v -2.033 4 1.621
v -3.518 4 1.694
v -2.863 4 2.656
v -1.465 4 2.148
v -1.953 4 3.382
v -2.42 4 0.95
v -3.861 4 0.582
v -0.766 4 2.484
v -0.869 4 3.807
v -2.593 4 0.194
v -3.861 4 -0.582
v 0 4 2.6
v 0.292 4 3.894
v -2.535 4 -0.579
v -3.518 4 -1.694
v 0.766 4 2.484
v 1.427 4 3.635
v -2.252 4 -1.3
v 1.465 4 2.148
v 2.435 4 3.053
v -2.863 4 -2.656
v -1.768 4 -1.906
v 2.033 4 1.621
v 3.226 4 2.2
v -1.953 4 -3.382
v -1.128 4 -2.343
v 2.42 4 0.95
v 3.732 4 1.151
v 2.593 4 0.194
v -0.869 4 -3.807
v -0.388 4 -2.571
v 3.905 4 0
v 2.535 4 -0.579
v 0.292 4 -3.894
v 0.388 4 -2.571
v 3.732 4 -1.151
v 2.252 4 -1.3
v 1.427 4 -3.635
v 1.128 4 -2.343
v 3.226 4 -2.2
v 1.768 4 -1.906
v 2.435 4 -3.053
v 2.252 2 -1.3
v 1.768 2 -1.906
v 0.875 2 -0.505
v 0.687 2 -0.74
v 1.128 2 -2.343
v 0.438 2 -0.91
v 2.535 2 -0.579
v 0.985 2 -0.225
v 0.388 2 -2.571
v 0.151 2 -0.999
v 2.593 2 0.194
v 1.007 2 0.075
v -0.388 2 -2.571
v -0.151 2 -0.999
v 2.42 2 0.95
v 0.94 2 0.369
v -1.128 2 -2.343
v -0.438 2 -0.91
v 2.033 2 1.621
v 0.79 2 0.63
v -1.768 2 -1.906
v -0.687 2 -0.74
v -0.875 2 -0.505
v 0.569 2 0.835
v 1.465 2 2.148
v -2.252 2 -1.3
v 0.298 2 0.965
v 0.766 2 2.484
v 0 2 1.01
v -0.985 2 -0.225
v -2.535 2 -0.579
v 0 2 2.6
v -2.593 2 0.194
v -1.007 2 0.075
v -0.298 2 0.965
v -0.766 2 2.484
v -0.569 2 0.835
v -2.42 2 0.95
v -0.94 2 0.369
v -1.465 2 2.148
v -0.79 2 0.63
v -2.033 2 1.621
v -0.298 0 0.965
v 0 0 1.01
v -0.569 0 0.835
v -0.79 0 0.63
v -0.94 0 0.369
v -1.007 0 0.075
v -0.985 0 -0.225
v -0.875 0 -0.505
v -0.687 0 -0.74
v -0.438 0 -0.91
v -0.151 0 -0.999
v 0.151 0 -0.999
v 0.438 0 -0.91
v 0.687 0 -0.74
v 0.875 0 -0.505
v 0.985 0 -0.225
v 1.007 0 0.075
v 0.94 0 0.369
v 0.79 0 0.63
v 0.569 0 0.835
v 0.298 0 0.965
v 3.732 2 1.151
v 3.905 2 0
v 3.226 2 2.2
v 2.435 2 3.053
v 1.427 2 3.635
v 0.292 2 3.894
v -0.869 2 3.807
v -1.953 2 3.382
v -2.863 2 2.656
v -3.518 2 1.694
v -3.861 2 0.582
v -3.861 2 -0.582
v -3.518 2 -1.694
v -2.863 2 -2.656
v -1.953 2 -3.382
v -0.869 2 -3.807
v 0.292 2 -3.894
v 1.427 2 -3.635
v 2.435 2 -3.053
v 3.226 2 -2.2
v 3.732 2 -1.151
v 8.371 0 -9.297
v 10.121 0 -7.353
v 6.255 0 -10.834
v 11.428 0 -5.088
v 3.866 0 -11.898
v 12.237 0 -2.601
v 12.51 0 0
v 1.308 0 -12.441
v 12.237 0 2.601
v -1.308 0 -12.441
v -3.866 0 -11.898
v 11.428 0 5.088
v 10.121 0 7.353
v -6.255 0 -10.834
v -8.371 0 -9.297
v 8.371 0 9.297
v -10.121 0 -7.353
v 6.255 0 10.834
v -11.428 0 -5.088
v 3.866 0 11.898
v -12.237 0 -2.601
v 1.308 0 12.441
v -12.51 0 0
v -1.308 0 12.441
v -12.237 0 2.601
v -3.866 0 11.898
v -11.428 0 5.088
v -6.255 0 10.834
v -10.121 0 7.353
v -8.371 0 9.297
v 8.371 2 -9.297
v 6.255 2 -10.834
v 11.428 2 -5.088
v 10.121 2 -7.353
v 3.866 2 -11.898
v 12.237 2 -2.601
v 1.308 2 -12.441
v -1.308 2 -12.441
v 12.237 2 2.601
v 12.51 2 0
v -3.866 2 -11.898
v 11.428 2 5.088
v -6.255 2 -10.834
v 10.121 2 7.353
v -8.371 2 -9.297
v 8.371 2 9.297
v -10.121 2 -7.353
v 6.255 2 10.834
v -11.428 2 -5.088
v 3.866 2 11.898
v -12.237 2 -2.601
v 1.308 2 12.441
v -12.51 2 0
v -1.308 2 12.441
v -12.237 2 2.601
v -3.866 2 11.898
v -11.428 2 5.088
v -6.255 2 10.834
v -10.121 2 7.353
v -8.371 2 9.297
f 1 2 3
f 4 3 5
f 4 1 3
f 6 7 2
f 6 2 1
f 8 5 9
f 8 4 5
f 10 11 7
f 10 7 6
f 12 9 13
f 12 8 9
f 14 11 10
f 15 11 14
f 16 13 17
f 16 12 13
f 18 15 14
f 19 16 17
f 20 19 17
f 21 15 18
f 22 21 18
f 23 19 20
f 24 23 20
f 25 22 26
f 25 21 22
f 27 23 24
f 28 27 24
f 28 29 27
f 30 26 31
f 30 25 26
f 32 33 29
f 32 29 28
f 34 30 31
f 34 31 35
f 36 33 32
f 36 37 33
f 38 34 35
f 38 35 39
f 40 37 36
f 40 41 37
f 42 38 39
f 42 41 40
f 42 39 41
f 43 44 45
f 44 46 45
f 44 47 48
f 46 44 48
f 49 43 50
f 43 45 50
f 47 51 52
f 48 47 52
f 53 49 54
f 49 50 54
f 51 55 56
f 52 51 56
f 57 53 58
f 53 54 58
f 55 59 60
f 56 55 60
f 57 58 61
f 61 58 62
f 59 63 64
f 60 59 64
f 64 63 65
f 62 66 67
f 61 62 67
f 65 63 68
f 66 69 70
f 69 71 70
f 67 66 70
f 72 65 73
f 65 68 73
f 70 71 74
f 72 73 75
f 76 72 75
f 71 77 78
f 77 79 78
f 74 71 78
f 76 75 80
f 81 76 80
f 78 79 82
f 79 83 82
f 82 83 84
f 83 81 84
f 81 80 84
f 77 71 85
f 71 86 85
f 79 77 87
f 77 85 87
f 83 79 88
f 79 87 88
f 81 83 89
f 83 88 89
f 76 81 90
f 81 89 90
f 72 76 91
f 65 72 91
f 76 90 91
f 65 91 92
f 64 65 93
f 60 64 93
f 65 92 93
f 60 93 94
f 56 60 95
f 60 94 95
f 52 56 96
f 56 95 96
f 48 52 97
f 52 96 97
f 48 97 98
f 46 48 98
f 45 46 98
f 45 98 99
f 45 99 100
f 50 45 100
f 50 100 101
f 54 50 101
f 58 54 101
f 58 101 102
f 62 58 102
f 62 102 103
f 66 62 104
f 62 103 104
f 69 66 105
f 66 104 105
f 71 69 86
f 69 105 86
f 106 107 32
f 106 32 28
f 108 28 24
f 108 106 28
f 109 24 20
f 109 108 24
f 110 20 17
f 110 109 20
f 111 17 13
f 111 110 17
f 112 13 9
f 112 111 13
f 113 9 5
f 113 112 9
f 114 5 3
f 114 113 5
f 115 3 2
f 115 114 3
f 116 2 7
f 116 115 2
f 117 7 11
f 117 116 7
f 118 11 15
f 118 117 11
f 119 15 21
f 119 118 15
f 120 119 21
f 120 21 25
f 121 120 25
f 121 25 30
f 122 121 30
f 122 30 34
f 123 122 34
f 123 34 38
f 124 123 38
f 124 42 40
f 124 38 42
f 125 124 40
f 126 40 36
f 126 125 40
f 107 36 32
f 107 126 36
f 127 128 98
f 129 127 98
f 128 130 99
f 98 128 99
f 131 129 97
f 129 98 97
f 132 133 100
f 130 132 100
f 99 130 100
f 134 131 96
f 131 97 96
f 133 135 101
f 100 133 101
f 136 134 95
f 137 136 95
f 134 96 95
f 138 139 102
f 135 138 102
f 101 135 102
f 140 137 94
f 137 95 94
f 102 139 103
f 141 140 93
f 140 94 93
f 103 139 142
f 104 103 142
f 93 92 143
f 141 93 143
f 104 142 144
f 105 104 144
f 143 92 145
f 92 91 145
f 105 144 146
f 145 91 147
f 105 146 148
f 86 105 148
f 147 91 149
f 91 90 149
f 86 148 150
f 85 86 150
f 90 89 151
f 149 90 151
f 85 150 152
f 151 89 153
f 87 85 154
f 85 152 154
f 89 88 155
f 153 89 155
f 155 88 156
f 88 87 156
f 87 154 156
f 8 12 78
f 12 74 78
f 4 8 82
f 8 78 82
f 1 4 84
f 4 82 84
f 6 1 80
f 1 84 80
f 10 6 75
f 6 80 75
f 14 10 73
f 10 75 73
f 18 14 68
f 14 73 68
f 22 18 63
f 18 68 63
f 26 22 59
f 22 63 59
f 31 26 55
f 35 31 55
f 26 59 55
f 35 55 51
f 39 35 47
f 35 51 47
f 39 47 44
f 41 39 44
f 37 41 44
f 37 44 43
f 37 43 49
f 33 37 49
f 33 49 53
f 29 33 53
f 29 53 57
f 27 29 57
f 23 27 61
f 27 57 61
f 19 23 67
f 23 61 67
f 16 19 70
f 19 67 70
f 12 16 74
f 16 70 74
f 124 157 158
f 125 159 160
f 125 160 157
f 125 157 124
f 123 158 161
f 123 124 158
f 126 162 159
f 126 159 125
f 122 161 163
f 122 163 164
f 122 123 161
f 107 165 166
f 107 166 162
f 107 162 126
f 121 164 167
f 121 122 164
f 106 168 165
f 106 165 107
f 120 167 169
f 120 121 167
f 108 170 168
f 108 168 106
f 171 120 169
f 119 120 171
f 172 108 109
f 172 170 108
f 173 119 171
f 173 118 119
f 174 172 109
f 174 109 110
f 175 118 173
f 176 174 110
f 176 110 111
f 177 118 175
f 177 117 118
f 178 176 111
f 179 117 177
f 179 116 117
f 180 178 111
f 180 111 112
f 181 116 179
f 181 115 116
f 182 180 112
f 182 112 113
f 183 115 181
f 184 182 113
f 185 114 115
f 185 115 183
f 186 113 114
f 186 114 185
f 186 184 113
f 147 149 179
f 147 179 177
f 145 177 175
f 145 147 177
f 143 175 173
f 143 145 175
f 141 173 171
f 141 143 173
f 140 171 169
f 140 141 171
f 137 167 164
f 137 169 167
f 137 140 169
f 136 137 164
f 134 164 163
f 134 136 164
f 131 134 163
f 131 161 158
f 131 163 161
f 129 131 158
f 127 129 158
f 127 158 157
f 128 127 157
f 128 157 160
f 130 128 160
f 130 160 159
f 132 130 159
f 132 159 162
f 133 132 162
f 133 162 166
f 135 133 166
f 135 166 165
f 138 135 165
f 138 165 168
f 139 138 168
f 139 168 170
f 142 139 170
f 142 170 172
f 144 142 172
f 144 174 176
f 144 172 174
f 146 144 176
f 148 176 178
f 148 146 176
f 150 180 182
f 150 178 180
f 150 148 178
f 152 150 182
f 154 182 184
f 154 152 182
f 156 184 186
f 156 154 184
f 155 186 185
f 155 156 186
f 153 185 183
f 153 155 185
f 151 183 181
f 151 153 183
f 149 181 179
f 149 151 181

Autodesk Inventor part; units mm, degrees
ref_plane "YZ Plane" through (0, 0, 0) normal (1, 0, 0) x (0, 1, 0)
ref_plane "XZ Plane" through (0, 0, 0) normal (0, 1, 0) x (-1, 0, 0)
ref_plane "XY Plane" through (0, 0, 0) normal (0, 0, 1) x (1, 0, 0)
sketch "Boceto1" plane through (0, 0, 0) normal (0, 1, 0) x (-1, 0, 0)
  circle A0 centre (0, 0) radius 12.51
  dimension "d0" = 25.02
extrude "Extrusión1" add sketch "Boceto1" along normal blind 2
sketch "Boceto2" plane through (0, 2, 0) normal (0, 1, 0) x (1, 0, 0)
  circle A0 centre (0, 0) radius 12.51 projected
  circle A1 centre (0, 0) radius 3.905
  dimension "d3" = 7.81
extrude "Extrusión2" add sketch "Boceto2" along normal blind 2 contours A1
hole "Hole1" at (0, 4, 0) direction (0, -1, 0) diameter 5.2 depth 2
hole "Hole2" at (0, 2, 0) direction (0, -1, 0) diameter 2.02 end through all
properties part number "TapaFrontal"
